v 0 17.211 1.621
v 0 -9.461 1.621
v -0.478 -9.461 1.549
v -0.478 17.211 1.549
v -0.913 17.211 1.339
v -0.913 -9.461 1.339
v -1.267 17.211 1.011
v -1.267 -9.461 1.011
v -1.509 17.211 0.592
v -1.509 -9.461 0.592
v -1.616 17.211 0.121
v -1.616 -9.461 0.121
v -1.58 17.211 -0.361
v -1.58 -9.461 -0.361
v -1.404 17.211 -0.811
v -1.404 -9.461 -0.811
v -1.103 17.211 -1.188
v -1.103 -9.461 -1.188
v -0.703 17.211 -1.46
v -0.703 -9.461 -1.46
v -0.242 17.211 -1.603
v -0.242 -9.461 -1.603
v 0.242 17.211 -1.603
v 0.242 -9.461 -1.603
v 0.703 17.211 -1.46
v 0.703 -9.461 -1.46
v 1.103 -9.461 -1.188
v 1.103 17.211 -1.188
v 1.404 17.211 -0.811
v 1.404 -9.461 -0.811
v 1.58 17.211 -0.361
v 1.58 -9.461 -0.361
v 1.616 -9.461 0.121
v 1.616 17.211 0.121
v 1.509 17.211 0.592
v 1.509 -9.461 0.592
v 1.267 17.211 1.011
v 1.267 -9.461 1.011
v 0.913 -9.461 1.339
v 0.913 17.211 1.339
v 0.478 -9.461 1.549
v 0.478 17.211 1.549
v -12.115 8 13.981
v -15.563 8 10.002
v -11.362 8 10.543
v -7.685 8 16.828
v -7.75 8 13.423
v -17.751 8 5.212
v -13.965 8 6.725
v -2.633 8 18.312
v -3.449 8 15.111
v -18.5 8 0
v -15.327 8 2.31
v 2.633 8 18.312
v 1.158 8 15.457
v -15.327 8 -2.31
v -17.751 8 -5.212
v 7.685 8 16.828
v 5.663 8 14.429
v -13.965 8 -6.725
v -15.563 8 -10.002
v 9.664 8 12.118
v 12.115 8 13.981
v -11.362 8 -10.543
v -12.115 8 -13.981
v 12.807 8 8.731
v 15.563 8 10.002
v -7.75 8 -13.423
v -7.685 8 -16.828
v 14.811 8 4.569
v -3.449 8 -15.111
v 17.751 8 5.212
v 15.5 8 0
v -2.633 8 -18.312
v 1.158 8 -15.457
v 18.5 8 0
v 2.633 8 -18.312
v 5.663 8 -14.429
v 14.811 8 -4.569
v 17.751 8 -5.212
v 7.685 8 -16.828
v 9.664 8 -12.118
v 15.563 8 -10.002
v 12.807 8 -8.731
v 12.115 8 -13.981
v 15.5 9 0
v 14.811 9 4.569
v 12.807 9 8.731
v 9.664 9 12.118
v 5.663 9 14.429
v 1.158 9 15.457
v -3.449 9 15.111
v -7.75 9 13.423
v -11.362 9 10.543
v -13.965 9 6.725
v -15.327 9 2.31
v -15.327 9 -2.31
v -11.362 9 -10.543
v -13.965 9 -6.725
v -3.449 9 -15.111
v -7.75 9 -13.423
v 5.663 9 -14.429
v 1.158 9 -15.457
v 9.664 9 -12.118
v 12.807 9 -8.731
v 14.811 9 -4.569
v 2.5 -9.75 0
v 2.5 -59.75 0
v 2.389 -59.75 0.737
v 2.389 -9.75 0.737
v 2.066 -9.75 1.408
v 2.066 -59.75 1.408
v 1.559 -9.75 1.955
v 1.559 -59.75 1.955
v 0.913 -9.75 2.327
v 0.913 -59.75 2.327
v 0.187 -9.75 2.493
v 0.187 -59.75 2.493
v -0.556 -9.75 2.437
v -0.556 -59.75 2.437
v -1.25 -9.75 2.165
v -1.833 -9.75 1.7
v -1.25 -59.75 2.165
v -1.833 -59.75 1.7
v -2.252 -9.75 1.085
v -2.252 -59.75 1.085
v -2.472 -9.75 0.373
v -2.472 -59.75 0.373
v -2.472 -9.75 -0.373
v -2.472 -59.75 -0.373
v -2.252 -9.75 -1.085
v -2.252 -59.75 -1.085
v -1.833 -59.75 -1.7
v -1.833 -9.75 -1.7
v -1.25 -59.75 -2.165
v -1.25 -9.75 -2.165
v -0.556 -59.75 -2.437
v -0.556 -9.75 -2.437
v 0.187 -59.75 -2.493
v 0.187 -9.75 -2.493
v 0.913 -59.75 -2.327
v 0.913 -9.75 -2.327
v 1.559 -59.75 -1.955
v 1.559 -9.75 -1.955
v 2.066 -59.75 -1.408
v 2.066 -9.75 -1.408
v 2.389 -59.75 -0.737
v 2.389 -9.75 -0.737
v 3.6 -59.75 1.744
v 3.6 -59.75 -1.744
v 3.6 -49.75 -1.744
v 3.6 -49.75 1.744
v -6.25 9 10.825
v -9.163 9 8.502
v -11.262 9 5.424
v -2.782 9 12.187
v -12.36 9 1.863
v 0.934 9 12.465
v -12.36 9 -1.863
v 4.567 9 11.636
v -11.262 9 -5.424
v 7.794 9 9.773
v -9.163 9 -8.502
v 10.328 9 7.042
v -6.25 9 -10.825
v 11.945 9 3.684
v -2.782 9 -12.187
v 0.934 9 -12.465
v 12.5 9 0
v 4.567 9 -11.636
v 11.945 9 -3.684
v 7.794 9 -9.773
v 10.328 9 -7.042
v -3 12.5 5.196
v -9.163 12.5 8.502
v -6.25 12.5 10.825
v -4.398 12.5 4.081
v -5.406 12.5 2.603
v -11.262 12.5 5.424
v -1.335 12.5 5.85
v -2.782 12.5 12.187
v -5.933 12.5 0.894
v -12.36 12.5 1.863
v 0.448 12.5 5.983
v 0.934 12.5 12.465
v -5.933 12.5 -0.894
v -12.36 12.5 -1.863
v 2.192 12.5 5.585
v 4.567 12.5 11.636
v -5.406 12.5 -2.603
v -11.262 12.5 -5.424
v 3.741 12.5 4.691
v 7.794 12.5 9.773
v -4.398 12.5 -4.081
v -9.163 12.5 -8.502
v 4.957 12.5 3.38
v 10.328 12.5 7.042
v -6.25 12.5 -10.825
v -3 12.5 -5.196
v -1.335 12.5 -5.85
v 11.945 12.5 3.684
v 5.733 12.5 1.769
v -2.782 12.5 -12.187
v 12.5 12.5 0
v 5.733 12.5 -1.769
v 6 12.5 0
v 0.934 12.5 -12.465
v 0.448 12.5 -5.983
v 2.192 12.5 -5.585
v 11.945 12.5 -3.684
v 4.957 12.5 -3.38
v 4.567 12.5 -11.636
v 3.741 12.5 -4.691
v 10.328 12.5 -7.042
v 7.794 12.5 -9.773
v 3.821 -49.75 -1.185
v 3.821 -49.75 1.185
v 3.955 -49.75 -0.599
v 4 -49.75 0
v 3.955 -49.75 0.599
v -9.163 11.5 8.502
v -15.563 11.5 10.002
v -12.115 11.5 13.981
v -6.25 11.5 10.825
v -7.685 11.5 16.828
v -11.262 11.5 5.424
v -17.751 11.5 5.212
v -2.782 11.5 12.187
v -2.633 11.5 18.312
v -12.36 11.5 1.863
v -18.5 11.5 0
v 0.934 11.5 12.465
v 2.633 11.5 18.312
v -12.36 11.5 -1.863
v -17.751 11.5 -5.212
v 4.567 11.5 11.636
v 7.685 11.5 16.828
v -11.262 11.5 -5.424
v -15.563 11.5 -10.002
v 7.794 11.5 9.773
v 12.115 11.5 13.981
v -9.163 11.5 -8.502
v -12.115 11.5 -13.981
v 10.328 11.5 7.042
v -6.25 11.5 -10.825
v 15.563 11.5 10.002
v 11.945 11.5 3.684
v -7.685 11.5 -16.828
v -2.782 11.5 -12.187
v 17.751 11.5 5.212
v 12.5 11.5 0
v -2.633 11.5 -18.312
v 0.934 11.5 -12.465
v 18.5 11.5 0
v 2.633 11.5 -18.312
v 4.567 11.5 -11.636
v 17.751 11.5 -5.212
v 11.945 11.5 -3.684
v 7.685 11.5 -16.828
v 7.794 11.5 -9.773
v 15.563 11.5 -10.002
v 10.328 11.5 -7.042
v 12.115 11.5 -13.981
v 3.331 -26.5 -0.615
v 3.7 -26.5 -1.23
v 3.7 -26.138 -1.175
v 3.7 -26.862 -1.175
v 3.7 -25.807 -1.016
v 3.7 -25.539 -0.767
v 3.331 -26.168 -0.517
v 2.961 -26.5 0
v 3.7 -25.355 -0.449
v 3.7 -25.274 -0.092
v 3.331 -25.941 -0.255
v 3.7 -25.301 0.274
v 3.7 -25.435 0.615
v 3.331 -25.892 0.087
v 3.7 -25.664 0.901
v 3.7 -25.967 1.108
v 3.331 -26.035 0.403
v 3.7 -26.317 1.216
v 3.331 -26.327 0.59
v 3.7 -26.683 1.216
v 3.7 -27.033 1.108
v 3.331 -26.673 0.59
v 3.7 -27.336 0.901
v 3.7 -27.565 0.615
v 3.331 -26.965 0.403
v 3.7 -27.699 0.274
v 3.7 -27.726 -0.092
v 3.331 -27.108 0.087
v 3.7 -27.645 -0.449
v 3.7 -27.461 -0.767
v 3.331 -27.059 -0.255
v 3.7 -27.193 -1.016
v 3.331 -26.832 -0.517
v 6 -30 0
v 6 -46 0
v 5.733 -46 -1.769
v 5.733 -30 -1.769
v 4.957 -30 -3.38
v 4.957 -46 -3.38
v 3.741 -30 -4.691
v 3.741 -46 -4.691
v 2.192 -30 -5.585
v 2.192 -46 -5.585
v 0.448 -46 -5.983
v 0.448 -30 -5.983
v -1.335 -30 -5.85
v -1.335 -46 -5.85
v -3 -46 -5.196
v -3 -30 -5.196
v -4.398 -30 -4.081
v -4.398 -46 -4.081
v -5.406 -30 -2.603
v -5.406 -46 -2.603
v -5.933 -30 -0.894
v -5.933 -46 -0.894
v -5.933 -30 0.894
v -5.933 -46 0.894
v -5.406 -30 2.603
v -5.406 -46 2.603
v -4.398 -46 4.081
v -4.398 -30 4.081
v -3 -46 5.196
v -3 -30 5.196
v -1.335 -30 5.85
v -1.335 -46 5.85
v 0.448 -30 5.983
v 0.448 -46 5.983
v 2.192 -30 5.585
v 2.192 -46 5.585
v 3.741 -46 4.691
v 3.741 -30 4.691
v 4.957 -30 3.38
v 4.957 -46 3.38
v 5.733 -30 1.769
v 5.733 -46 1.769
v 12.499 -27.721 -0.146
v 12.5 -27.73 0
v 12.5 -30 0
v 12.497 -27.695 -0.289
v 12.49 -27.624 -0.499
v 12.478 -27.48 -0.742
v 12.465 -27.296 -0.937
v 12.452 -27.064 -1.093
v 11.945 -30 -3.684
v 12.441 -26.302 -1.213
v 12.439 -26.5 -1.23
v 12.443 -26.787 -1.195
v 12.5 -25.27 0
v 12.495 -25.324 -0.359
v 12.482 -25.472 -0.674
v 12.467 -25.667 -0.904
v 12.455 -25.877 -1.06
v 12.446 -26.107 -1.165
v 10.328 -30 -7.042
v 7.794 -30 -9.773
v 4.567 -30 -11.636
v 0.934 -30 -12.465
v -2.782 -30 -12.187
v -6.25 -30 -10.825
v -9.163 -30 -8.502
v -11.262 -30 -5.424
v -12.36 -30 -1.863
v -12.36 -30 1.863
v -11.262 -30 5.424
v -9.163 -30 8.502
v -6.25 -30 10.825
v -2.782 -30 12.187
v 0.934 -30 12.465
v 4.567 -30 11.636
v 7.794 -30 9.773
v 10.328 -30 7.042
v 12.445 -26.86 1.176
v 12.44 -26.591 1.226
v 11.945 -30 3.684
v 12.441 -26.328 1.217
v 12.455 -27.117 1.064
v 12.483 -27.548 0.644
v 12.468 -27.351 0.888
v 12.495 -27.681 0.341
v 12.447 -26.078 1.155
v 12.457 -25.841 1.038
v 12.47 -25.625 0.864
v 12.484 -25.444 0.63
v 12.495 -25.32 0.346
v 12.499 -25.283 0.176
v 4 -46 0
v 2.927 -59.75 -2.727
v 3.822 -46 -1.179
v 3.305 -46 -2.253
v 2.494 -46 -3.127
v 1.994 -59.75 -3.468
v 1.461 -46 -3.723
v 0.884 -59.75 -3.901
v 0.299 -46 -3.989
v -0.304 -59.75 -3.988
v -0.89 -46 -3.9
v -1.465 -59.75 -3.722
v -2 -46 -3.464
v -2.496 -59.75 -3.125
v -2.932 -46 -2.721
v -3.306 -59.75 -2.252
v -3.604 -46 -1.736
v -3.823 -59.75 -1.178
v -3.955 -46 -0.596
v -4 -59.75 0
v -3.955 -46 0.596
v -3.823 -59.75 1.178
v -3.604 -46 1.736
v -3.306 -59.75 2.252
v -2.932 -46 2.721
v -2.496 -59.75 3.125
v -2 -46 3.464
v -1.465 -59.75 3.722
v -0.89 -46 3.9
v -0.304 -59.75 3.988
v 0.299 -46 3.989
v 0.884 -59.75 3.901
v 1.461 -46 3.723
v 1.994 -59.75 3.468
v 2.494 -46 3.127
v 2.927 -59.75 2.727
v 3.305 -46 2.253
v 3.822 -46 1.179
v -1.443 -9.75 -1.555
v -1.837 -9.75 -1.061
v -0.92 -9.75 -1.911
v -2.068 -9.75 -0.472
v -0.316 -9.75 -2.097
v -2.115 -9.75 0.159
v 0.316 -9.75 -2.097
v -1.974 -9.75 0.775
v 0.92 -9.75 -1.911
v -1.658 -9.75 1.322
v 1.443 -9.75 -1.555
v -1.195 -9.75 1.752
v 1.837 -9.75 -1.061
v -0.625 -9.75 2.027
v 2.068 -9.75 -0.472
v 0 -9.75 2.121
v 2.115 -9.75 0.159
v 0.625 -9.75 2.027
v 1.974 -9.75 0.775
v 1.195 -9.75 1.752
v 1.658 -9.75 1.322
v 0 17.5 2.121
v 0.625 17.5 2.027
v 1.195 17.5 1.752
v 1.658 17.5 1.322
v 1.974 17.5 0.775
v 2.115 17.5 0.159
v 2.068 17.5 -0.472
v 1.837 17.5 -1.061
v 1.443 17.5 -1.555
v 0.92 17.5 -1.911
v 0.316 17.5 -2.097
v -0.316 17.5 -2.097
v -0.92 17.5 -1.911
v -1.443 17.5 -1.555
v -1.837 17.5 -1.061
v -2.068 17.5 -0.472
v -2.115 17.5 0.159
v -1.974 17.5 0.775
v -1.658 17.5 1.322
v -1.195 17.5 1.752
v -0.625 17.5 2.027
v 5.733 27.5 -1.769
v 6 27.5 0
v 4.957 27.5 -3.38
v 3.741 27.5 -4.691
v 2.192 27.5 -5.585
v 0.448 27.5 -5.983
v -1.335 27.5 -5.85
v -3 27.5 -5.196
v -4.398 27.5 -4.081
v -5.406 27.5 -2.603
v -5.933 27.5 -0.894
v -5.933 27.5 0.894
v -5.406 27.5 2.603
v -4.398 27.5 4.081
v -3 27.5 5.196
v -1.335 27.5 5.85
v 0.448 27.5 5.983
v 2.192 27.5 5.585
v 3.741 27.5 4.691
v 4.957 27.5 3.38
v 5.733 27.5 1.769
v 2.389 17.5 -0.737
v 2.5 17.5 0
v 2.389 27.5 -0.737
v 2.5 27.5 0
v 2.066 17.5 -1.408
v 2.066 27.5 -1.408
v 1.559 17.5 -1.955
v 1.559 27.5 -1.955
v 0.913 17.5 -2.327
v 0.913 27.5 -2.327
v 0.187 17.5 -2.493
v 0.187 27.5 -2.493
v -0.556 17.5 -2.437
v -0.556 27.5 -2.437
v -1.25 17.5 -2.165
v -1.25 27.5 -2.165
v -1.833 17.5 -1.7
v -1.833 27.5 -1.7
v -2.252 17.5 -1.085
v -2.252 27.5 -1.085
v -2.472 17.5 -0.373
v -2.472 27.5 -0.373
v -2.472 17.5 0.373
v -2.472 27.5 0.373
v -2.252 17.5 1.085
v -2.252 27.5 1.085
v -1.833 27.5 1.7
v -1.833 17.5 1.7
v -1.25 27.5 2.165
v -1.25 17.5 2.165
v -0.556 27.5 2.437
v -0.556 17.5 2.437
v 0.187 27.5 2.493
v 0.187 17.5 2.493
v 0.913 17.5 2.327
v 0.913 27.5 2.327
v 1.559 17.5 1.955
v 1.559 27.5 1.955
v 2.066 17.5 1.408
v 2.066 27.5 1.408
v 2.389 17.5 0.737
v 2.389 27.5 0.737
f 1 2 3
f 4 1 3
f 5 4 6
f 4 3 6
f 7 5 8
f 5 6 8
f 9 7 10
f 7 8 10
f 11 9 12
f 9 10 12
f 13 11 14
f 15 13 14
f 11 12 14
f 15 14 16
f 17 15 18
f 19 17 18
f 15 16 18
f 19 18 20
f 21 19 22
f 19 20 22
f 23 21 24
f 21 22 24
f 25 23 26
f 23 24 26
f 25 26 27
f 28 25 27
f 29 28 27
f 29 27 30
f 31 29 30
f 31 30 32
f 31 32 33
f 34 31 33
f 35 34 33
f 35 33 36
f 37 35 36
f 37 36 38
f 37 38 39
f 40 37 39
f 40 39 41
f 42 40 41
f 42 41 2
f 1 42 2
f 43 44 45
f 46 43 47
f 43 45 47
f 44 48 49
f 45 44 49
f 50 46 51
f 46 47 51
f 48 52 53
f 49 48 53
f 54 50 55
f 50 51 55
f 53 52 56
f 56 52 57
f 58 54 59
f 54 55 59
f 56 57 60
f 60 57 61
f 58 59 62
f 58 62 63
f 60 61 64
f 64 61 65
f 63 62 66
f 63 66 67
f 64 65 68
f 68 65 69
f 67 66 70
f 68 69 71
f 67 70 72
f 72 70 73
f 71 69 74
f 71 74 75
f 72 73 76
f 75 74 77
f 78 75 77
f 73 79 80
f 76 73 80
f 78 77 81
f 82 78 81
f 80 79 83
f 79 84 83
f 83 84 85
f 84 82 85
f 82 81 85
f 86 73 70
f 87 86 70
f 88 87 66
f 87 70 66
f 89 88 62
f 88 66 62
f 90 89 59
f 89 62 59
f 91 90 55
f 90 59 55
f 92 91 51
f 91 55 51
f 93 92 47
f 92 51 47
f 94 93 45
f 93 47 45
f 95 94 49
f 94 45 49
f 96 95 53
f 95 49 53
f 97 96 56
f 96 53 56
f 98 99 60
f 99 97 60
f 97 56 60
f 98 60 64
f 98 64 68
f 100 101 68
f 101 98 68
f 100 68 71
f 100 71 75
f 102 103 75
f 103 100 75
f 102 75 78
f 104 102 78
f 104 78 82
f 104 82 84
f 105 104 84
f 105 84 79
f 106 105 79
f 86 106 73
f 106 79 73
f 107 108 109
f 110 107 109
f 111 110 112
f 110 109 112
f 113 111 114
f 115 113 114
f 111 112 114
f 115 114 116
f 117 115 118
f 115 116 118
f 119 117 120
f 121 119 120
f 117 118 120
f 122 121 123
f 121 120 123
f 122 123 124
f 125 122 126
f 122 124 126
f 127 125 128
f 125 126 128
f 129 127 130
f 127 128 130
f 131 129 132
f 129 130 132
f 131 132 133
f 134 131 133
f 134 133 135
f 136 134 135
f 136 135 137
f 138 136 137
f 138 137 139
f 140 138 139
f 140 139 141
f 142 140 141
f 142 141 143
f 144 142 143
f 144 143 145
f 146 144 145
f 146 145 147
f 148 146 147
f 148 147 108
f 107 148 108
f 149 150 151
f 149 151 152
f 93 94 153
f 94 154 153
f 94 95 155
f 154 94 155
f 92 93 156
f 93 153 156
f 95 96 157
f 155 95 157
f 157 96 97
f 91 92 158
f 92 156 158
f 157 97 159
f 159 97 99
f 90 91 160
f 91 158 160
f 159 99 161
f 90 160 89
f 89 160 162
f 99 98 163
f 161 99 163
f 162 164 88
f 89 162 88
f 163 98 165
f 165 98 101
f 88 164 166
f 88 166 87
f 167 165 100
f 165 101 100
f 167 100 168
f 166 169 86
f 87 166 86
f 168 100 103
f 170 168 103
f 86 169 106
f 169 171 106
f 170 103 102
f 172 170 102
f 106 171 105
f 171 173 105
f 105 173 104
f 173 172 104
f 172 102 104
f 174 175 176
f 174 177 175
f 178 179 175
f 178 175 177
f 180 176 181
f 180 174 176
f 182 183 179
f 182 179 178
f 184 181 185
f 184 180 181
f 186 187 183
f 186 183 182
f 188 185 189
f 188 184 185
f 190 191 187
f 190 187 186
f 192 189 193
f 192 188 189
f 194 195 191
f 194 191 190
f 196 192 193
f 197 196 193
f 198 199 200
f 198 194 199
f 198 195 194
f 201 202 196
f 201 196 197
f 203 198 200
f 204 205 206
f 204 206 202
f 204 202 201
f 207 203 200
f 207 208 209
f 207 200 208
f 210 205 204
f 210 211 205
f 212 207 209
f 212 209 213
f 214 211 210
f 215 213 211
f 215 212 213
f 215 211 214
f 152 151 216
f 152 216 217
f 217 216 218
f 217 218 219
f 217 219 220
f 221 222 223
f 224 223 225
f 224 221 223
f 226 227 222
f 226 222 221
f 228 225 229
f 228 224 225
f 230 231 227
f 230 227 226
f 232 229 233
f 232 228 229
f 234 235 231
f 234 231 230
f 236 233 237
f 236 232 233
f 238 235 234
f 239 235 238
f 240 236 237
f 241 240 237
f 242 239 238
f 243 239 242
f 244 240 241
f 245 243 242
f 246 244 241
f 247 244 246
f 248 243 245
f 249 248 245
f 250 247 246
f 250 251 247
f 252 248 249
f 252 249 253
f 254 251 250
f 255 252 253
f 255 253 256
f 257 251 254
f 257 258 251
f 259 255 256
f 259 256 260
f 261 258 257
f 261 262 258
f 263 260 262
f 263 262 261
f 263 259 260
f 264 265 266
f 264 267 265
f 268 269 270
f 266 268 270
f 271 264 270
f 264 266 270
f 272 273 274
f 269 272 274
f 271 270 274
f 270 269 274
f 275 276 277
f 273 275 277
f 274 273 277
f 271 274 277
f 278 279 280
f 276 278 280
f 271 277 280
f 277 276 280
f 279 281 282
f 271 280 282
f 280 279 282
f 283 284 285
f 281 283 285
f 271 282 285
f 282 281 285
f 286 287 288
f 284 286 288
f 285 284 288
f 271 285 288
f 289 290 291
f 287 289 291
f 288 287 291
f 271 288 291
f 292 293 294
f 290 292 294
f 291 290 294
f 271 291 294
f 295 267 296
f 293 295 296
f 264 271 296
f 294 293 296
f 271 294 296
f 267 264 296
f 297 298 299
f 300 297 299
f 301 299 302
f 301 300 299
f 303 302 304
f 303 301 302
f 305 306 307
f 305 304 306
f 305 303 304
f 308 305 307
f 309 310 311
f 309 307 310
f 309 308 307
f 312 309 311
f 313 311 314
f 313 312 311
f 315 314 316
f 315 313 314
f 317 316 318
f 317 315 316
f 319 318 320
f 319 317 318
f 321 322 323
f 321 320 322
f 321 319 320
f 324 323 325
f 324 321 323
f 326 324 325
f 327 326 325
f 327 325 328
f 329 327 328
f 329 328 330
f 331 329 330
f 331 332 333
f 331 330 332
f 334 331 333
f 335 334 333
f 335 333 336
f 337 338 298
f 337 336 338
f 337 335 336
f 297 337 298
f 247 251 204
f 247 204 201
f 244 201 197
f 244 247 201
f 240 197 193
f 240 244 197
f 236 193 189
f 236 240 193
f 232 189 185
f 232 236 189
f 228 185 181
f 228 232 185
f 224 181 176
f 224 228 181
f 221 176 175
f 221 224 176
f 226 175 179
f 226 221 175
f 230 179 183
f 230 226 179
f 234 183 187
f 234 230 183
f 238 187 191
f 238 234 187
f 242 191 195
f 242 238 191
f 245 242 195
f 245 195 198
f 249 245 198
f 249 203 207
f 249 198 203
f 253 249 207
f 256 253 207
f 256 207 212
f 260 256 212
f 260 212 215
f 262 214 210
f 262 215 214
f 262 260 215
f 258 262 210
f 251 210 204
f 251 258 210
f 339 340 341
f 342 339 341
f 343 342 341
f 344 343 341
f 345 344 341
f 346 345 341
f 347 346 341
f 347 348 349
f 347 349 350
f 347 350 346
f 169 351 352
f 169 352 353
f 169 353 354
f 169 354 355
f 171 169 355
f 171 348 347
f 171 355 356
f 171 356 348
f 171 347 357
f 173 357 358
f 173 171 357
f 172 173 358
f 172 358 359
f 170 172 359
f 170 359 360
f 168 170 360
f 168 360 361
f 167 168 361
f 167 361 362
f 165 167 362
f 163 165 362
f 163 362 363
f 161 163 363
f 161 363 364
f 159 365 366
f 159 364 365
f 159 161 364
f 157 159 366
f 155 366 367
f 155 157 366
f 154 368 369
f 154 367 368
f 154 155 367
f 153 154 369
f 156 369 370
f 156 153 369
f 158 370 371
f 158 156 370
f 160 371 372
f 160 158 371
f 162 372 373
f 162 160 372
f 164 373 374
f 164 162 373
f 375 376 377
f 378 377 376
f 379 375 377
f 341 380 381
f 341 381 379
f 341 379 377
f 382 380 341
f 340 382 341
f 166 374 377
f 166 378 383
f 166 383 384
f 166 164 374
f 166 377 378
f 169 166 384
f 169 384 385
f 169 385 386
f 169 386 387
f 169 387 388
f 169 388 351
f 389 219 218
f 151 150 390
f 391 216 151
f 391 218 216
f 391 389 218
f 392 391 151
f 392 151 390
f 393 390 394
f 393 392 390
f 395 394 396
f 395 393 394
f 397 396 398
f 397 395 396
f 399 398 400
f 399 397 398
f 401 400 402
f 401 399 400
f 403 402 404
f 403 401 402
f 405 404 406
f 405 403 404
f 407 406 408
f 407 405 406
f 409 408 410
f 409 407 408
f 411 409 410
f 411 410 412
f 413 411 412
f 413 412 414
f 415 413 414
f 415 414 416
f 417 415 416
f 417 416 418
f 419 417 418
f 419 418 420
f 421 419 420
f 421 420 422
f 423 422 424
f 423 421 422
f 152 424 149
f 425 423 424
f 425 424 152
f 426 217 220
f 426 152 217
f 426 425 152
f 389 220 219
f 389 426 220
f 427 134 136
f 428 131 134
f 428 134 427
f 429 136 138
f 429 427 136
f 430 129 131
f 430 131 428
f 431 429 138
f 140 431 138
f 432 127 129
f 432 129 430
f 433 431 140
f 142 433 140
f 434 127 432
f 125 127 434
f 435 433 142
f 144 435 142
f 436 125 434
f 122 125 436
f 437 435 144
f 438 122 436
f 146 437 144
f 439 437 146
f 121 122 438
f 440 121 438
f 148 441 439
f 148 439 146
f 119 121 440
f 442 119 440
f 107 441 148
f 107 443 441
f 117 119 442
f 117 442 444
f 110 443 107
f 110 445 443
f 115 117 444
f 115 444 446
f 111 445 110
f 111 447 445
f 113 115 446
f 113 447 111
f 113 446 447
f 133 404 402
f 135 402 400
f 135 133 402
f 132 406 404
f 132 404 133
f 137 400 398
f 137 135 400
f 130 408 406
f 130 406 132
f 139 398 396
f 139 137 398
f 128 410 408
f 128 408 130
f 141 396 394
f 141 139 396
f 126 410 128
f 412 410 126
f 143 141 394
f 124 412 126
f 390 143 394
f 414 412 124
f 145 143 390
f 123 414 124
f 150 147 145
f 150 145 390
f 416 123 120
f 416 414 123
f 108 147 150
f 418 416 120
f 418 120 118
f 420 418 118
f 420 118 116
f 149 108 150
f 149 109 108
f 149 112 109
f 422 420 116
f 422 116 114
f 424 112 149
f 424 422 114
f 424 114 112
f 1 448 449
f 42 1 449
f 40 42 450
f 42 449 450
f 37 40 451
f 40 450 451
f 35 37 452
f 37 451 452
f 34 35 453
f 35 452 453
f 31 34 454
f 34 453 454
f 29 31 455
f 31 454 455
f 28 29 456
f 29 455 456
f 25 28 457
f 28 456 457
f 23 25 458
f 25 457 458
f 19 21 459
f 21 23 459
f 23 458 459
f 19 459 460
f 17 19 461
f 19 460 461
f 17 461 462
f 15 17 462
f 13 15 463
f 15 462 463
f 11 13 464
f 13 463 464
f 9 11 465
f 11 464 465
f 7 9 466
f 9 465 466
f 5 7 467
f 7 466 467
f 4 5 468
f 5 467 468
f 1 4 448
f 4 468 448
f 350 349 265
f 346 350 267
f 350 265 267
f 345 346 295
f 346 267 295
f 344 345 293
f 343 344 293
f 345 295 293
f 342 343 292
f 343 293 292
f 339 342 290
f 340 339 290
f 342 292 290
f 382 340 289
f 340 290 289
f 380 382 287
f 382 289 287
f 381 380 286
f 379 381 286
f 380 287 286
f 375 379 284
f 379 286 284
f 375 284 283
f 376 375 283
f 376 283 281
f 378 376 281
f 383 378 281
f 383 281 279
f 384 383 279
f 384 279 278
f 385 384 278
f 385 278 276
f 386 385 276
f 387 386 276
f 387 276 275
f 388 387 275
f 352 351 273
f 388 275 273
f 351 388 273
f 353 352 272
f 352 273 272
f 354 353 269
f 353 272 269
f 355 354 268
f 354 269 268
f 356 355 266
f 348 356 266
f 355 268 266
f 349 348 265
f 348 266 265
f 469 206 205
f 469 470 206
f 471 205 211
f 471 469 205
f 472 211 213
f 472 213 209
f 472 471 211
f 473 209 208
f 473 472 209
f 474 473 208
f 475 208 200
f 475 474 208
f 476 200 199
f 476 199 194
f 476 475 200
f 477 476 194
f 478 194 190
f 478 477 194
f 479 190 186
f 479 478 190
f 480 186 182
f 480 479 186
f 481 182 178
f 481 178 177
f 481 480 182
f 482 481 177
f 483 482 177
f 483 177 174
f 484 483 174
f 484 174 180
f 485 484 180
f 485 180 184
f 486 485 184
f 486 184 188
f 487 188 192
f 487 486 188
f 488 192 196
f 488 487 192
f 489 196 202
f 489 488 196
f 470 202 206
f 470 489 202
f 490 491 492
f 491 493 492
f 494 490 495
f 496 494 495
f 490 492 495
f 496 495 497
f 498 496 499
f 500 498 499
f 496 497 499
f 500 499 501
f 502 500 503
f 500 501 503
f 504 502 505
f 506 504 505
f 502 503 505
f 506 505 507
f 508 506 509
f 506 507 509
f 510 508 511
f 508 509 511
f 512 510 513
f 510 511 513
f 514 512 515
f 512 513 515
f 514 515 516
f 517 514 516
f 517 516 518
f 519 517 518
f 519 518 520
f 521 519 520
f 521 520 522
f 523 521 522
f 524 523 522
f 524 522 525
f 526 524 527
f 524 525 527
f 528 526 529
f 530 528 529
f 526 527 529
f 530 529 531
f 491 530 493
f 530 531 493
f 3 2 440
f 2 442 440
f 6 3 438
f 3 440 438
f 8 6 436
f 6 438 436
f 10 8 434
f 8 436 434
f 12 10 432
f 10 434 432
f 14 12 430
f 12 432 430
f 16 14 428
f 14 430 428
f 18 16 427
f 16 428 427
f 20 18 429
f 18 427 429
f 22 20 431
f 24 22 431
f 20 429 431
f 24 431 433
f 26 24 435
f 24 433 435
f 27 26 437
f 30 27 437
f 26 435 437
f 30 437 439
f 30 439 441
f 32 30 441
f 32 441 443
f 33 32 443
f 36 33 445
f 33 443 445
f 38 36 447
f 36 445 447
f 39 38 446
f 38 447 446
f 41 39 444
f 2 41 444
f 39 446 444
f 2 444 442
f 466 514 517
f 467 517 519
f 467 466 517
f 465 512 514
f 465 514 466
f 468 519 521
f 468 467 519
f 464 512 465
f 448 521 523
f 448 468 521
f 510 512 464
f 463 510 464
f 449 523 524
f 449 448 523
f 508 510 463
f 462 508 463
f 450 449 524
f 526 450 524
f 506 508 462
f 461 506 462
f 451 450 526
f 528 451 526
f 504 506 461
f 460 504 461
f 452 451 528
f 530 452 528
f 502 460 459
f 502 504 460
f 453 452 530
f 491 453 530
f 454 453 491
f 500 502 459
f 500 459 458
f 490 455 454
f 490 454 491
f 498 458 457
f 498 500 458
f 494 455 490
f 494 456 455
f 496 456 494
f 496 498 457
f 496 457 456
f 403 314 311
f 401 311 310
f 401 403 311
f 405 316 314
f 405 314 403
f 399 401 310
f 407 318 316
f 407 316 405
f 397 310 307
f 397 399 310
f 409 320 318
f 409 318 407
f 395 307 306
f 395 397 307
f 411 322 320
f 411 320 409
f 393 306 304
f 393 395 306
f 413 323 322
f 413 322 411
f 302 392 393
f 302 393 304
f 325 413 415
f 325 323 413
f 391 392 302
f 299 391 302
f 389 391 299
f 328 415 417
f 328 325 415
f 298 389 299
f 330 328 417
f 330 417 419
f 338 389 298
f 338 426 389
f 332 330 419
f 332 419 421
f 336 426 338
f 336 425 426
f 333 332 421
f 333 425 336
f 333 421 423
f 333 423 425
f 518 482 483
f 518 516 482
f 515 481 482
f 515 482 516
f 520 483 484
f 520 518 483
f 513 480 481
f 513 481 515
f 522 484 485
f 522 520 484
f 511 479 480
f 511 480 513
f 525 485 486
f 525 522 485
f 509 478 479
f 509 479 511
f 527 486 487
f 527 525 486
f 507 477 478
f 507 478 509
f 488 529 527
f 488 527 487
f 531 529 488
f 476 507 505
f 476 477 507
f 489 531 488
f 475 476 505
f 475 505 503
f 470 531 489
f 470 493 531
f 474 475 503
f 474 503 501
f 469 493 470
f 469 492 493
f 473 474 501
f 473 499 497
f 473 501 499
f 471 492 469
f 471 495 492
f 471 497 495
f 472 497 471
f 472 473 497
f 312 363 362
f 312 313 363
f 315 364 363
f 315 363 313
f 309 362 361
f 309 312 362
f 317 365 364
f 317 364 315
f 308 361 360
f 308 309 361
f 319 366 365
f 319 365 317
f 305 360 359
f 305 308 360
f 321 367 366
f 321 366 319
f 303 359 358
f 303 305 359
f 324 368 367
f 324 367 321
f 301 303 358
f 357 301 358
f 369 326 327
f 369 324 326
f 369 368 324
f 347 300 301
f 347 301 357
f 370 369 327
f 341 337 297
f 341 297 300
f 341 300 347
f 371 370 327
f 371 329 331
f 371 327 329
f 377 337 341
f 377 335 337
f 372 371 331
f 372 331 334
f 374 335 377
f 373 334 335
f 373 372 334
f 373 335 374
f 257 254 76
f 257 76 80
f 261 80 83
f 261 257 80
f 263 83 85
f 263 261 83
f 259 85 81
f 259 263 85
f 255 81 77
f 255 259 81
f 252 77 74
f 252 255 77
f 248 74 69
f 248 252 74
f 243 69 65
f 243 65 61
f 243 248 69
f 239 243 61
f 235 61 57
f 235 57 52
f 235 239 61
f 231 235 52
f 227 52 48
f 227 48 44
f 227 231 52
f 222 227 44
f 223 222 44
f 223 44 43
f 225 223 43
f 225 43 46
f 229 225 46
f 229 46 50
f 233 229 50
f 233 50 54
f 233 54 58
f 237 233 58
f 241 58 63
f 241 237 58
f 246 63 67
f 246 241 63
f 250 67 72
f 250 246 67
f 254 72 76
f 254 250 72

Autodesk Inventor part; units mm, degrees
ref_plane "XZ Plane" through (0, 0, 0) normal (0, 1, 0) x (-1, 0, 0)
ref_plane "XY Plane" through (0, 0, 0) normal (0, 0, 1) x (1, 0, 0)
sketch "Sketch1" plane through (0, 0, 0) normal (0, 0, 1) x (1, 0, 0)
  line L0 (0, -17.5) -> (8.5, -17.5)
  line L1 (8.5, -17.5) -> (8.5, 17.5)
  line L2 (8.5, 17.5) -> (0, 17.5)
  line L3 (0, 17.5) -> (0, -17.5)
  line L4 (8.5, 11.5) -> (18.5, 11.5)
  line L5 (18.5, 11.5) -> (18.5, 9)
  line L6 (18.5, 9) -> (8.5, 9)
  line L7 (8.5, 9) -> (8.5, 11.5)
  line L8 (18.5, 9) -> (15.5, 9)
  line L9 (15.5, 9) -> (15.5, 8)
  line L10 (15.5, 8) -> (18.5, 8)
  line L11 (18.5, 8) -> (18.5, 9)
  line L12 (0, -24.5) -> (0, 24.5) construction
  line L13 (8.5, -17.5) -> (12.5, -17.5)
  line L14 (12.5, -17.5) -> (12.5, 9)
  line L15 (12.5, 9) -> (8.5, 9)
  line L16 (8.5, 9) -> (8.5, -17.5)
  line L17 (8.5, 11.5) -> (6, 11.5)
  line L18 (6, 11.5) -> (6, 17.5)
  point P0 (0, 0)
  point P1 (0, 0)
  point P2 (8.5, 9)
  dimension "d0" = 35
  dimension "d1" = 8.5
  dimension "d2" = 10
  dimension "d3" = 2.5
  dimension "d4" = 6
  dimension "d5" = 3
  dimension "d6" = 1
  dimension "d32" = 4
  dimension "d69" = 6
revolve "Revolution1" add sketch "Sketch1" angle 360 about axis through (0, -10, 0) along (0, 1, 0) contours L3 L2 L18 L17 L1 L0 | L1 L6 L14 L13 | L1 L4 L5 L6 | L6 L11 L10 L9
sketch "Sketch3" plane through (0, -17.5, 0) normal (0, -1, 0) x (1, 0, 0)
  circle A0 centre (0, 0) radius 12.5 projected
extrude "Extrusion1" add sketch "Sketch3" along normal blind 12.5
sketch "Sketch4" plane through (0, -30, 0) normal (0, -1, 0) x (1, 0, 0)
  circle A0 centre (0, 0) radius 4
  circle A1 centre (0, 0) radius 12.5 projected
  dimension "d24" = 8
extrude "Extrusion2" add sketch "Sketch4" along normal blind 29.75 contours A0
sketch "Sketch5" plane through (0, 17.5, 0) normal (0, 1, 0) x (1, 0, 0)
  circle A0 centre (0, 0) radius 6 projected
extrude "Extrusion3" add sketch "Sketch5" along normal blind 10
sketch "Sketch6" plane through (0, 11.5, 0) normal (0, 1, 0) x (1, 0, 0)
  circle A0 centre (0, 0) radius 2.621 projected
  circle A1 centre (0, 0) radius 12.5
  circle A2 centre (0, 0) radius 6 projected
  dimension "d29" = 25
extrude "Extrusion4" add sketch "Sketch6" along normal blind 1 contours A0 | A1 | A2
sketch "Sketch7" plane through (0, 27.5, 0) normal (0, 1, 0) x (1, 0, 0)
  point P0 (0, 0)
  point P1 (0, 0)
hole "Hole2" at (0, 27.5, 0) direction (0, -1, 0) diameter 3.242 end through all thread size "M4x0.7" class "6H" standard "ISO Metric profile"
sketch "Sketch8" plane through (0, 27.5, 0) normal (0, 1, 0) x (1, 0, 0)
  circle A0 centre (0, 0) radius 2.5
  dimension "d41" = 5
extrude "Extrusion5" cut sketch "Sketch8" against normal blind 10
sketch "Sketch9" plane through (0, -59.75, 0) normal (0, -1, 0) x (1, 0, 0)
  circle A0 centre (0, 0) radius 2.5
  dimension "d44" = 5
extrude "Extrusion6" cut sketch "Sketch9" against normal blind 50
chamfer "Chamfer3" distance 0.5 angle 30 1 edges at (0, -9.75, -1.621) measured on face at (2.1788, -9.75, -0.2646)
chamfer "Chamfer4" distance 0.5 angle 30 1 edges at (0, 17.5, -1.621) measured on face at (2.1788, 17.5, 0.2646)
ref_plane "Work Plane1" through (12.5, 0, 0) normal (1, 0, 0) x (0, 1, 0)
sketch "Sketch10" plane through (12.5, 0, 0) normal (1, 0, 0) x (0, 1, 0)
  line L0 (27.5, -8.5) -> (27.5, 8.5) projected
  line L1 (-37.3, 0) -> (38.3, 0) projected
  point P0 (0, 0)
  point P1 (-26.5, 0)
  dimension "d54" = 54
hole "Hole3" at (12.5, -26.5, 0) direction (-1, 0, 0) diameter 2.459 depth 8.8 tip angle 118 thread size "M3x0.5" class "6H" standard "ISO Metric profile"
sketch "Sketch11" plane through (0, -59.75, 0) normal (0, -1, 0) x (1, 0, 0)
  circle A0 centre (0, 0) radius 2.5 projected
  circle A1 centre (0, 0) radius 4 projected
  line L0 (3.6, -1.7436) -> (3.6, 1.7436)
  point P0 (3.6, 0)
  dimension "d65" = 3.6
extrude "Extrusion7" cut sketch "Sketch11" against normal blind 10 contours A0 | A1 L0 picked at (3.6735, -0.3949)
sketch "Sketch12" plane through (0, -30, 0) normal (0, -1, 0) x (1, 0, 0)
  circle A0 centre (0, 0) radius 6
  circle A1 centre (0, 0) radius 2.5 projected
  dimension "d66" = 12
extrude "Extrusion8" add sketch "Sketch12" along normal blind 16
properties part number "shaft"
